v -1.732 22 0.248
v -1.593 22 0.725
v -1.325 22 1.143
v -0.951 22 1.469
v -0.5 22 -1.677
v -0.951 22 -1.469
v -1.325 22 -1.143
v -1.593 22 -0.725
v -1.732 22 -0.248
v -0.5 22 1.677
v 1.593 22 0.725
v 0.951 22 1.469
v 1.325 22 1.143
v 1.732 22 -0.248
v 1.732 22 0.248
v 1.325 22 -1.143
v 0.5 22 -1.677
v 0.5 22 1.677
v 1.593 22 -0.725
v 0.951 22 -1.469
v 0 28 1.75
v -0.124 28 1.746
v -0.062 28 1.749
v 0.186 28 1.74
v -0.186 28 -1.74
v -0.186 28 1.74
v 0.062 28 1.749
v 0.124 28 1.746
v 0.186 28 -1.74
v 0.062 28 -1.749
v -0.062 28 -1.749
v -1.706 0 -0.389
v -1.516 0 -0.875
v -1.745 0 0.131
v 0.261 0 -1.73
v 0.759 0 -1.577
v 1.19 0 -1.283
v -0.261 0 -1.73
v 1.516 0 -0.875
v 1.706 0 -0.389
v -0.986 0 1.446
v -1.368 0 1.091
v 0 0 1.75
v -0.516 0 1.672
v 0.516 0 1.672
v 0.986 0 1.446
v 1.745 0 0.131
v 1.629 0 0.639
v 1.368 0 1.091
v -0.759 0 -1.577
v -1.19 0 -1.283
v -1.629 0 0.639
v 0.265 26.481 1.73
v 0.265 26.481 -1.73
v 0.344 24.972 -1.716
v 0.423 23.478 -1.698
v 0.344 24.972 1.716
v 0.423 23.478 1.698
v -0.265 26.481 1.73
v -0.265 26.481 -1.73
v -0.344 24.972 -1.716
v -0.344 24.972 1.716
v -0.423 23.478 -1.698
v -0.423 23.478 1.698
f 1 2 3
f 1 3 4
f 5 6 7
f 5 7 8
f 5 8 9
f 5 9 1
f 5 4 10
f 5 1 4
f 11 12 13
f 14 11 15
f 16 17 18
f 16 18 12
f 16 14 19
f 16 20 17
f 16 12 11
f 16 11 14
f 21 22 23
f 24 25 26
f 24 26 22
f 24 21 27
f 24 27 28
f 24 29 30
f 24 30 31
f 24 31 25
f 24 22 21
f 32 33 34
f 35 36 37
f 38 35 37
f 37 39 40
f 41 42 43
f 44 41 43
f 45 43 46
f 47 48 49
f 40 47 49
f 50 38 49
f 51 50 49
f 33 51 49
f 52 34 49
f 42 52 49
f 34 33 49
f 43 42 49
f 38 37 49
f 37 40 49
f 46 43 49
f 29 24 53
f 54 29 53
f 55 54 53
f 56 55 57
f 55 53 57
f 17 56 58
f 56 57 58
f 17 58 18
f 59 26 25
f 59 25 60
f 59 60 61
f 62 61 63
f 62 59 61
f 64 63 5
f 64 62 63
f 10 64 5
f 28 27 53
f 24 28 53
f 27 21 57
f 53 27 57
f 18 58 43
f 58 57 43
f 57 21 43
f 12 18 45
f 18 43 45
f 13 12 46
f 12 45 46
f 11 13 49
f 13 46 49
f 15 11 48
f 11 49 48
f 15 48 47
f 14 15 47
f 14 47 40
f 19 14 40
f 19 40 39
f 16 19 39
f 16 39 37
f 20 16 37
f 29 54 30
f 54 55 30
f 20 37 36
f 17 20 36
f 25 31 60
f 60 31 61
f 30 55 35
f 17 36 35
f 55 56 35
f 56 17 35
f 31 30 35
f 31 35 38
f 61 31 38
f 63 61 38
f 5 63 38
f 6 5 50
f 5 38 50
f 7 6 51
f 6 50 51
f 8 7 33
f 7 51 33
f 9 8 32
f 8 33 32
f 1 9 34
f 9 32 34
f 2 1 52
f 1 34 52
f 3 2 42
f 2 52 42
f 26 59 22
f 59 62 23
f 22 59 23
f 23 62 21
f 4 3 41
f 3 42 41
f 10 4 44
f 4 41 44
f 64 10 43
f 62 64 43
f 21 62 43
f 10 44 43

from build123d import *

# Parameters (mm, degrees)
SKETCH2_R               = 1.75
BOSS_EXTRUDE2_DEPTH     = 28
CUT_EXTRUDE1_START      = -6
CUT_EXTRUDE1_DEPTH      = 6
CUT_EXTRUDE2_DEPTH      = 29.263177076
CUT_EXTRUDE2_DEPTH_BACK = 29.263177076


with BuildPart() as part:
    # Sketch2 → Boss-Extrude2 (new body)
    with BuildSketch(Plane(origin=(0, 0, 0), x_dir=(1, 0, 0), z_dir=(0, 1, 0))):
        with Locations(Location((0, 0, 0), (0, 0, 270))):
            Circle(SKETCH2_R)
    extrude(amount=BOSS_EXTRUDE2_DEPTH)

    # Sketch5 → Cut-Extrude1 (cut)
    with BuildSketch(Plane(origin=(0, 28, 0), x_dir=(1, 0, 0), z_dir=(0, 1, 0)).offset(CUT_EXTRUDE1_START)):
        with BuildLine():
            Line((0.5, 1.677050983), (0.5, -1.677050983))
            ThreePointArc((0.5, -1.677050983), (1.75, 0), (0.5, 1.677050983))
        make_face()
        with BuildLine():
            Line((-0.5, -1.677050983), (-0.5, 1.677050983))
            ThreePointArc((-0.5, 1.677050983), (-1.75, 0), (-0.5, -1.677050983))
        make_face()
    extrude(amount=CUT_EXTRUDE1_DEPTH, mode=Mode.SUBTRACT)

    # Sketch9 → Cut-Extrude2 (cut, two sides: drawn at the far end of the back side and taken through both)
    with BuildSketch(Plane(origin=(0, 0, 1.677050983), x_dir=(-1, 0, 0), z_dir=(0, 0, -1)).offset(-CUT_EXTRUDE2_DEPTH_BACK)):
        Polygon((0.5, 22), (0.5, 28), (0.185553324, 28), align=None)
        Polygon((-0.5, 22), (-0.5, 28), (-0.185553324, 28), align=None)
    extrude(amount=CUT_EXTRUDE2_DEPTH + CUT_EXTRUDE2_DEPTH_BACK, mode=Mode.SUBTRACT)


solid = part.part
